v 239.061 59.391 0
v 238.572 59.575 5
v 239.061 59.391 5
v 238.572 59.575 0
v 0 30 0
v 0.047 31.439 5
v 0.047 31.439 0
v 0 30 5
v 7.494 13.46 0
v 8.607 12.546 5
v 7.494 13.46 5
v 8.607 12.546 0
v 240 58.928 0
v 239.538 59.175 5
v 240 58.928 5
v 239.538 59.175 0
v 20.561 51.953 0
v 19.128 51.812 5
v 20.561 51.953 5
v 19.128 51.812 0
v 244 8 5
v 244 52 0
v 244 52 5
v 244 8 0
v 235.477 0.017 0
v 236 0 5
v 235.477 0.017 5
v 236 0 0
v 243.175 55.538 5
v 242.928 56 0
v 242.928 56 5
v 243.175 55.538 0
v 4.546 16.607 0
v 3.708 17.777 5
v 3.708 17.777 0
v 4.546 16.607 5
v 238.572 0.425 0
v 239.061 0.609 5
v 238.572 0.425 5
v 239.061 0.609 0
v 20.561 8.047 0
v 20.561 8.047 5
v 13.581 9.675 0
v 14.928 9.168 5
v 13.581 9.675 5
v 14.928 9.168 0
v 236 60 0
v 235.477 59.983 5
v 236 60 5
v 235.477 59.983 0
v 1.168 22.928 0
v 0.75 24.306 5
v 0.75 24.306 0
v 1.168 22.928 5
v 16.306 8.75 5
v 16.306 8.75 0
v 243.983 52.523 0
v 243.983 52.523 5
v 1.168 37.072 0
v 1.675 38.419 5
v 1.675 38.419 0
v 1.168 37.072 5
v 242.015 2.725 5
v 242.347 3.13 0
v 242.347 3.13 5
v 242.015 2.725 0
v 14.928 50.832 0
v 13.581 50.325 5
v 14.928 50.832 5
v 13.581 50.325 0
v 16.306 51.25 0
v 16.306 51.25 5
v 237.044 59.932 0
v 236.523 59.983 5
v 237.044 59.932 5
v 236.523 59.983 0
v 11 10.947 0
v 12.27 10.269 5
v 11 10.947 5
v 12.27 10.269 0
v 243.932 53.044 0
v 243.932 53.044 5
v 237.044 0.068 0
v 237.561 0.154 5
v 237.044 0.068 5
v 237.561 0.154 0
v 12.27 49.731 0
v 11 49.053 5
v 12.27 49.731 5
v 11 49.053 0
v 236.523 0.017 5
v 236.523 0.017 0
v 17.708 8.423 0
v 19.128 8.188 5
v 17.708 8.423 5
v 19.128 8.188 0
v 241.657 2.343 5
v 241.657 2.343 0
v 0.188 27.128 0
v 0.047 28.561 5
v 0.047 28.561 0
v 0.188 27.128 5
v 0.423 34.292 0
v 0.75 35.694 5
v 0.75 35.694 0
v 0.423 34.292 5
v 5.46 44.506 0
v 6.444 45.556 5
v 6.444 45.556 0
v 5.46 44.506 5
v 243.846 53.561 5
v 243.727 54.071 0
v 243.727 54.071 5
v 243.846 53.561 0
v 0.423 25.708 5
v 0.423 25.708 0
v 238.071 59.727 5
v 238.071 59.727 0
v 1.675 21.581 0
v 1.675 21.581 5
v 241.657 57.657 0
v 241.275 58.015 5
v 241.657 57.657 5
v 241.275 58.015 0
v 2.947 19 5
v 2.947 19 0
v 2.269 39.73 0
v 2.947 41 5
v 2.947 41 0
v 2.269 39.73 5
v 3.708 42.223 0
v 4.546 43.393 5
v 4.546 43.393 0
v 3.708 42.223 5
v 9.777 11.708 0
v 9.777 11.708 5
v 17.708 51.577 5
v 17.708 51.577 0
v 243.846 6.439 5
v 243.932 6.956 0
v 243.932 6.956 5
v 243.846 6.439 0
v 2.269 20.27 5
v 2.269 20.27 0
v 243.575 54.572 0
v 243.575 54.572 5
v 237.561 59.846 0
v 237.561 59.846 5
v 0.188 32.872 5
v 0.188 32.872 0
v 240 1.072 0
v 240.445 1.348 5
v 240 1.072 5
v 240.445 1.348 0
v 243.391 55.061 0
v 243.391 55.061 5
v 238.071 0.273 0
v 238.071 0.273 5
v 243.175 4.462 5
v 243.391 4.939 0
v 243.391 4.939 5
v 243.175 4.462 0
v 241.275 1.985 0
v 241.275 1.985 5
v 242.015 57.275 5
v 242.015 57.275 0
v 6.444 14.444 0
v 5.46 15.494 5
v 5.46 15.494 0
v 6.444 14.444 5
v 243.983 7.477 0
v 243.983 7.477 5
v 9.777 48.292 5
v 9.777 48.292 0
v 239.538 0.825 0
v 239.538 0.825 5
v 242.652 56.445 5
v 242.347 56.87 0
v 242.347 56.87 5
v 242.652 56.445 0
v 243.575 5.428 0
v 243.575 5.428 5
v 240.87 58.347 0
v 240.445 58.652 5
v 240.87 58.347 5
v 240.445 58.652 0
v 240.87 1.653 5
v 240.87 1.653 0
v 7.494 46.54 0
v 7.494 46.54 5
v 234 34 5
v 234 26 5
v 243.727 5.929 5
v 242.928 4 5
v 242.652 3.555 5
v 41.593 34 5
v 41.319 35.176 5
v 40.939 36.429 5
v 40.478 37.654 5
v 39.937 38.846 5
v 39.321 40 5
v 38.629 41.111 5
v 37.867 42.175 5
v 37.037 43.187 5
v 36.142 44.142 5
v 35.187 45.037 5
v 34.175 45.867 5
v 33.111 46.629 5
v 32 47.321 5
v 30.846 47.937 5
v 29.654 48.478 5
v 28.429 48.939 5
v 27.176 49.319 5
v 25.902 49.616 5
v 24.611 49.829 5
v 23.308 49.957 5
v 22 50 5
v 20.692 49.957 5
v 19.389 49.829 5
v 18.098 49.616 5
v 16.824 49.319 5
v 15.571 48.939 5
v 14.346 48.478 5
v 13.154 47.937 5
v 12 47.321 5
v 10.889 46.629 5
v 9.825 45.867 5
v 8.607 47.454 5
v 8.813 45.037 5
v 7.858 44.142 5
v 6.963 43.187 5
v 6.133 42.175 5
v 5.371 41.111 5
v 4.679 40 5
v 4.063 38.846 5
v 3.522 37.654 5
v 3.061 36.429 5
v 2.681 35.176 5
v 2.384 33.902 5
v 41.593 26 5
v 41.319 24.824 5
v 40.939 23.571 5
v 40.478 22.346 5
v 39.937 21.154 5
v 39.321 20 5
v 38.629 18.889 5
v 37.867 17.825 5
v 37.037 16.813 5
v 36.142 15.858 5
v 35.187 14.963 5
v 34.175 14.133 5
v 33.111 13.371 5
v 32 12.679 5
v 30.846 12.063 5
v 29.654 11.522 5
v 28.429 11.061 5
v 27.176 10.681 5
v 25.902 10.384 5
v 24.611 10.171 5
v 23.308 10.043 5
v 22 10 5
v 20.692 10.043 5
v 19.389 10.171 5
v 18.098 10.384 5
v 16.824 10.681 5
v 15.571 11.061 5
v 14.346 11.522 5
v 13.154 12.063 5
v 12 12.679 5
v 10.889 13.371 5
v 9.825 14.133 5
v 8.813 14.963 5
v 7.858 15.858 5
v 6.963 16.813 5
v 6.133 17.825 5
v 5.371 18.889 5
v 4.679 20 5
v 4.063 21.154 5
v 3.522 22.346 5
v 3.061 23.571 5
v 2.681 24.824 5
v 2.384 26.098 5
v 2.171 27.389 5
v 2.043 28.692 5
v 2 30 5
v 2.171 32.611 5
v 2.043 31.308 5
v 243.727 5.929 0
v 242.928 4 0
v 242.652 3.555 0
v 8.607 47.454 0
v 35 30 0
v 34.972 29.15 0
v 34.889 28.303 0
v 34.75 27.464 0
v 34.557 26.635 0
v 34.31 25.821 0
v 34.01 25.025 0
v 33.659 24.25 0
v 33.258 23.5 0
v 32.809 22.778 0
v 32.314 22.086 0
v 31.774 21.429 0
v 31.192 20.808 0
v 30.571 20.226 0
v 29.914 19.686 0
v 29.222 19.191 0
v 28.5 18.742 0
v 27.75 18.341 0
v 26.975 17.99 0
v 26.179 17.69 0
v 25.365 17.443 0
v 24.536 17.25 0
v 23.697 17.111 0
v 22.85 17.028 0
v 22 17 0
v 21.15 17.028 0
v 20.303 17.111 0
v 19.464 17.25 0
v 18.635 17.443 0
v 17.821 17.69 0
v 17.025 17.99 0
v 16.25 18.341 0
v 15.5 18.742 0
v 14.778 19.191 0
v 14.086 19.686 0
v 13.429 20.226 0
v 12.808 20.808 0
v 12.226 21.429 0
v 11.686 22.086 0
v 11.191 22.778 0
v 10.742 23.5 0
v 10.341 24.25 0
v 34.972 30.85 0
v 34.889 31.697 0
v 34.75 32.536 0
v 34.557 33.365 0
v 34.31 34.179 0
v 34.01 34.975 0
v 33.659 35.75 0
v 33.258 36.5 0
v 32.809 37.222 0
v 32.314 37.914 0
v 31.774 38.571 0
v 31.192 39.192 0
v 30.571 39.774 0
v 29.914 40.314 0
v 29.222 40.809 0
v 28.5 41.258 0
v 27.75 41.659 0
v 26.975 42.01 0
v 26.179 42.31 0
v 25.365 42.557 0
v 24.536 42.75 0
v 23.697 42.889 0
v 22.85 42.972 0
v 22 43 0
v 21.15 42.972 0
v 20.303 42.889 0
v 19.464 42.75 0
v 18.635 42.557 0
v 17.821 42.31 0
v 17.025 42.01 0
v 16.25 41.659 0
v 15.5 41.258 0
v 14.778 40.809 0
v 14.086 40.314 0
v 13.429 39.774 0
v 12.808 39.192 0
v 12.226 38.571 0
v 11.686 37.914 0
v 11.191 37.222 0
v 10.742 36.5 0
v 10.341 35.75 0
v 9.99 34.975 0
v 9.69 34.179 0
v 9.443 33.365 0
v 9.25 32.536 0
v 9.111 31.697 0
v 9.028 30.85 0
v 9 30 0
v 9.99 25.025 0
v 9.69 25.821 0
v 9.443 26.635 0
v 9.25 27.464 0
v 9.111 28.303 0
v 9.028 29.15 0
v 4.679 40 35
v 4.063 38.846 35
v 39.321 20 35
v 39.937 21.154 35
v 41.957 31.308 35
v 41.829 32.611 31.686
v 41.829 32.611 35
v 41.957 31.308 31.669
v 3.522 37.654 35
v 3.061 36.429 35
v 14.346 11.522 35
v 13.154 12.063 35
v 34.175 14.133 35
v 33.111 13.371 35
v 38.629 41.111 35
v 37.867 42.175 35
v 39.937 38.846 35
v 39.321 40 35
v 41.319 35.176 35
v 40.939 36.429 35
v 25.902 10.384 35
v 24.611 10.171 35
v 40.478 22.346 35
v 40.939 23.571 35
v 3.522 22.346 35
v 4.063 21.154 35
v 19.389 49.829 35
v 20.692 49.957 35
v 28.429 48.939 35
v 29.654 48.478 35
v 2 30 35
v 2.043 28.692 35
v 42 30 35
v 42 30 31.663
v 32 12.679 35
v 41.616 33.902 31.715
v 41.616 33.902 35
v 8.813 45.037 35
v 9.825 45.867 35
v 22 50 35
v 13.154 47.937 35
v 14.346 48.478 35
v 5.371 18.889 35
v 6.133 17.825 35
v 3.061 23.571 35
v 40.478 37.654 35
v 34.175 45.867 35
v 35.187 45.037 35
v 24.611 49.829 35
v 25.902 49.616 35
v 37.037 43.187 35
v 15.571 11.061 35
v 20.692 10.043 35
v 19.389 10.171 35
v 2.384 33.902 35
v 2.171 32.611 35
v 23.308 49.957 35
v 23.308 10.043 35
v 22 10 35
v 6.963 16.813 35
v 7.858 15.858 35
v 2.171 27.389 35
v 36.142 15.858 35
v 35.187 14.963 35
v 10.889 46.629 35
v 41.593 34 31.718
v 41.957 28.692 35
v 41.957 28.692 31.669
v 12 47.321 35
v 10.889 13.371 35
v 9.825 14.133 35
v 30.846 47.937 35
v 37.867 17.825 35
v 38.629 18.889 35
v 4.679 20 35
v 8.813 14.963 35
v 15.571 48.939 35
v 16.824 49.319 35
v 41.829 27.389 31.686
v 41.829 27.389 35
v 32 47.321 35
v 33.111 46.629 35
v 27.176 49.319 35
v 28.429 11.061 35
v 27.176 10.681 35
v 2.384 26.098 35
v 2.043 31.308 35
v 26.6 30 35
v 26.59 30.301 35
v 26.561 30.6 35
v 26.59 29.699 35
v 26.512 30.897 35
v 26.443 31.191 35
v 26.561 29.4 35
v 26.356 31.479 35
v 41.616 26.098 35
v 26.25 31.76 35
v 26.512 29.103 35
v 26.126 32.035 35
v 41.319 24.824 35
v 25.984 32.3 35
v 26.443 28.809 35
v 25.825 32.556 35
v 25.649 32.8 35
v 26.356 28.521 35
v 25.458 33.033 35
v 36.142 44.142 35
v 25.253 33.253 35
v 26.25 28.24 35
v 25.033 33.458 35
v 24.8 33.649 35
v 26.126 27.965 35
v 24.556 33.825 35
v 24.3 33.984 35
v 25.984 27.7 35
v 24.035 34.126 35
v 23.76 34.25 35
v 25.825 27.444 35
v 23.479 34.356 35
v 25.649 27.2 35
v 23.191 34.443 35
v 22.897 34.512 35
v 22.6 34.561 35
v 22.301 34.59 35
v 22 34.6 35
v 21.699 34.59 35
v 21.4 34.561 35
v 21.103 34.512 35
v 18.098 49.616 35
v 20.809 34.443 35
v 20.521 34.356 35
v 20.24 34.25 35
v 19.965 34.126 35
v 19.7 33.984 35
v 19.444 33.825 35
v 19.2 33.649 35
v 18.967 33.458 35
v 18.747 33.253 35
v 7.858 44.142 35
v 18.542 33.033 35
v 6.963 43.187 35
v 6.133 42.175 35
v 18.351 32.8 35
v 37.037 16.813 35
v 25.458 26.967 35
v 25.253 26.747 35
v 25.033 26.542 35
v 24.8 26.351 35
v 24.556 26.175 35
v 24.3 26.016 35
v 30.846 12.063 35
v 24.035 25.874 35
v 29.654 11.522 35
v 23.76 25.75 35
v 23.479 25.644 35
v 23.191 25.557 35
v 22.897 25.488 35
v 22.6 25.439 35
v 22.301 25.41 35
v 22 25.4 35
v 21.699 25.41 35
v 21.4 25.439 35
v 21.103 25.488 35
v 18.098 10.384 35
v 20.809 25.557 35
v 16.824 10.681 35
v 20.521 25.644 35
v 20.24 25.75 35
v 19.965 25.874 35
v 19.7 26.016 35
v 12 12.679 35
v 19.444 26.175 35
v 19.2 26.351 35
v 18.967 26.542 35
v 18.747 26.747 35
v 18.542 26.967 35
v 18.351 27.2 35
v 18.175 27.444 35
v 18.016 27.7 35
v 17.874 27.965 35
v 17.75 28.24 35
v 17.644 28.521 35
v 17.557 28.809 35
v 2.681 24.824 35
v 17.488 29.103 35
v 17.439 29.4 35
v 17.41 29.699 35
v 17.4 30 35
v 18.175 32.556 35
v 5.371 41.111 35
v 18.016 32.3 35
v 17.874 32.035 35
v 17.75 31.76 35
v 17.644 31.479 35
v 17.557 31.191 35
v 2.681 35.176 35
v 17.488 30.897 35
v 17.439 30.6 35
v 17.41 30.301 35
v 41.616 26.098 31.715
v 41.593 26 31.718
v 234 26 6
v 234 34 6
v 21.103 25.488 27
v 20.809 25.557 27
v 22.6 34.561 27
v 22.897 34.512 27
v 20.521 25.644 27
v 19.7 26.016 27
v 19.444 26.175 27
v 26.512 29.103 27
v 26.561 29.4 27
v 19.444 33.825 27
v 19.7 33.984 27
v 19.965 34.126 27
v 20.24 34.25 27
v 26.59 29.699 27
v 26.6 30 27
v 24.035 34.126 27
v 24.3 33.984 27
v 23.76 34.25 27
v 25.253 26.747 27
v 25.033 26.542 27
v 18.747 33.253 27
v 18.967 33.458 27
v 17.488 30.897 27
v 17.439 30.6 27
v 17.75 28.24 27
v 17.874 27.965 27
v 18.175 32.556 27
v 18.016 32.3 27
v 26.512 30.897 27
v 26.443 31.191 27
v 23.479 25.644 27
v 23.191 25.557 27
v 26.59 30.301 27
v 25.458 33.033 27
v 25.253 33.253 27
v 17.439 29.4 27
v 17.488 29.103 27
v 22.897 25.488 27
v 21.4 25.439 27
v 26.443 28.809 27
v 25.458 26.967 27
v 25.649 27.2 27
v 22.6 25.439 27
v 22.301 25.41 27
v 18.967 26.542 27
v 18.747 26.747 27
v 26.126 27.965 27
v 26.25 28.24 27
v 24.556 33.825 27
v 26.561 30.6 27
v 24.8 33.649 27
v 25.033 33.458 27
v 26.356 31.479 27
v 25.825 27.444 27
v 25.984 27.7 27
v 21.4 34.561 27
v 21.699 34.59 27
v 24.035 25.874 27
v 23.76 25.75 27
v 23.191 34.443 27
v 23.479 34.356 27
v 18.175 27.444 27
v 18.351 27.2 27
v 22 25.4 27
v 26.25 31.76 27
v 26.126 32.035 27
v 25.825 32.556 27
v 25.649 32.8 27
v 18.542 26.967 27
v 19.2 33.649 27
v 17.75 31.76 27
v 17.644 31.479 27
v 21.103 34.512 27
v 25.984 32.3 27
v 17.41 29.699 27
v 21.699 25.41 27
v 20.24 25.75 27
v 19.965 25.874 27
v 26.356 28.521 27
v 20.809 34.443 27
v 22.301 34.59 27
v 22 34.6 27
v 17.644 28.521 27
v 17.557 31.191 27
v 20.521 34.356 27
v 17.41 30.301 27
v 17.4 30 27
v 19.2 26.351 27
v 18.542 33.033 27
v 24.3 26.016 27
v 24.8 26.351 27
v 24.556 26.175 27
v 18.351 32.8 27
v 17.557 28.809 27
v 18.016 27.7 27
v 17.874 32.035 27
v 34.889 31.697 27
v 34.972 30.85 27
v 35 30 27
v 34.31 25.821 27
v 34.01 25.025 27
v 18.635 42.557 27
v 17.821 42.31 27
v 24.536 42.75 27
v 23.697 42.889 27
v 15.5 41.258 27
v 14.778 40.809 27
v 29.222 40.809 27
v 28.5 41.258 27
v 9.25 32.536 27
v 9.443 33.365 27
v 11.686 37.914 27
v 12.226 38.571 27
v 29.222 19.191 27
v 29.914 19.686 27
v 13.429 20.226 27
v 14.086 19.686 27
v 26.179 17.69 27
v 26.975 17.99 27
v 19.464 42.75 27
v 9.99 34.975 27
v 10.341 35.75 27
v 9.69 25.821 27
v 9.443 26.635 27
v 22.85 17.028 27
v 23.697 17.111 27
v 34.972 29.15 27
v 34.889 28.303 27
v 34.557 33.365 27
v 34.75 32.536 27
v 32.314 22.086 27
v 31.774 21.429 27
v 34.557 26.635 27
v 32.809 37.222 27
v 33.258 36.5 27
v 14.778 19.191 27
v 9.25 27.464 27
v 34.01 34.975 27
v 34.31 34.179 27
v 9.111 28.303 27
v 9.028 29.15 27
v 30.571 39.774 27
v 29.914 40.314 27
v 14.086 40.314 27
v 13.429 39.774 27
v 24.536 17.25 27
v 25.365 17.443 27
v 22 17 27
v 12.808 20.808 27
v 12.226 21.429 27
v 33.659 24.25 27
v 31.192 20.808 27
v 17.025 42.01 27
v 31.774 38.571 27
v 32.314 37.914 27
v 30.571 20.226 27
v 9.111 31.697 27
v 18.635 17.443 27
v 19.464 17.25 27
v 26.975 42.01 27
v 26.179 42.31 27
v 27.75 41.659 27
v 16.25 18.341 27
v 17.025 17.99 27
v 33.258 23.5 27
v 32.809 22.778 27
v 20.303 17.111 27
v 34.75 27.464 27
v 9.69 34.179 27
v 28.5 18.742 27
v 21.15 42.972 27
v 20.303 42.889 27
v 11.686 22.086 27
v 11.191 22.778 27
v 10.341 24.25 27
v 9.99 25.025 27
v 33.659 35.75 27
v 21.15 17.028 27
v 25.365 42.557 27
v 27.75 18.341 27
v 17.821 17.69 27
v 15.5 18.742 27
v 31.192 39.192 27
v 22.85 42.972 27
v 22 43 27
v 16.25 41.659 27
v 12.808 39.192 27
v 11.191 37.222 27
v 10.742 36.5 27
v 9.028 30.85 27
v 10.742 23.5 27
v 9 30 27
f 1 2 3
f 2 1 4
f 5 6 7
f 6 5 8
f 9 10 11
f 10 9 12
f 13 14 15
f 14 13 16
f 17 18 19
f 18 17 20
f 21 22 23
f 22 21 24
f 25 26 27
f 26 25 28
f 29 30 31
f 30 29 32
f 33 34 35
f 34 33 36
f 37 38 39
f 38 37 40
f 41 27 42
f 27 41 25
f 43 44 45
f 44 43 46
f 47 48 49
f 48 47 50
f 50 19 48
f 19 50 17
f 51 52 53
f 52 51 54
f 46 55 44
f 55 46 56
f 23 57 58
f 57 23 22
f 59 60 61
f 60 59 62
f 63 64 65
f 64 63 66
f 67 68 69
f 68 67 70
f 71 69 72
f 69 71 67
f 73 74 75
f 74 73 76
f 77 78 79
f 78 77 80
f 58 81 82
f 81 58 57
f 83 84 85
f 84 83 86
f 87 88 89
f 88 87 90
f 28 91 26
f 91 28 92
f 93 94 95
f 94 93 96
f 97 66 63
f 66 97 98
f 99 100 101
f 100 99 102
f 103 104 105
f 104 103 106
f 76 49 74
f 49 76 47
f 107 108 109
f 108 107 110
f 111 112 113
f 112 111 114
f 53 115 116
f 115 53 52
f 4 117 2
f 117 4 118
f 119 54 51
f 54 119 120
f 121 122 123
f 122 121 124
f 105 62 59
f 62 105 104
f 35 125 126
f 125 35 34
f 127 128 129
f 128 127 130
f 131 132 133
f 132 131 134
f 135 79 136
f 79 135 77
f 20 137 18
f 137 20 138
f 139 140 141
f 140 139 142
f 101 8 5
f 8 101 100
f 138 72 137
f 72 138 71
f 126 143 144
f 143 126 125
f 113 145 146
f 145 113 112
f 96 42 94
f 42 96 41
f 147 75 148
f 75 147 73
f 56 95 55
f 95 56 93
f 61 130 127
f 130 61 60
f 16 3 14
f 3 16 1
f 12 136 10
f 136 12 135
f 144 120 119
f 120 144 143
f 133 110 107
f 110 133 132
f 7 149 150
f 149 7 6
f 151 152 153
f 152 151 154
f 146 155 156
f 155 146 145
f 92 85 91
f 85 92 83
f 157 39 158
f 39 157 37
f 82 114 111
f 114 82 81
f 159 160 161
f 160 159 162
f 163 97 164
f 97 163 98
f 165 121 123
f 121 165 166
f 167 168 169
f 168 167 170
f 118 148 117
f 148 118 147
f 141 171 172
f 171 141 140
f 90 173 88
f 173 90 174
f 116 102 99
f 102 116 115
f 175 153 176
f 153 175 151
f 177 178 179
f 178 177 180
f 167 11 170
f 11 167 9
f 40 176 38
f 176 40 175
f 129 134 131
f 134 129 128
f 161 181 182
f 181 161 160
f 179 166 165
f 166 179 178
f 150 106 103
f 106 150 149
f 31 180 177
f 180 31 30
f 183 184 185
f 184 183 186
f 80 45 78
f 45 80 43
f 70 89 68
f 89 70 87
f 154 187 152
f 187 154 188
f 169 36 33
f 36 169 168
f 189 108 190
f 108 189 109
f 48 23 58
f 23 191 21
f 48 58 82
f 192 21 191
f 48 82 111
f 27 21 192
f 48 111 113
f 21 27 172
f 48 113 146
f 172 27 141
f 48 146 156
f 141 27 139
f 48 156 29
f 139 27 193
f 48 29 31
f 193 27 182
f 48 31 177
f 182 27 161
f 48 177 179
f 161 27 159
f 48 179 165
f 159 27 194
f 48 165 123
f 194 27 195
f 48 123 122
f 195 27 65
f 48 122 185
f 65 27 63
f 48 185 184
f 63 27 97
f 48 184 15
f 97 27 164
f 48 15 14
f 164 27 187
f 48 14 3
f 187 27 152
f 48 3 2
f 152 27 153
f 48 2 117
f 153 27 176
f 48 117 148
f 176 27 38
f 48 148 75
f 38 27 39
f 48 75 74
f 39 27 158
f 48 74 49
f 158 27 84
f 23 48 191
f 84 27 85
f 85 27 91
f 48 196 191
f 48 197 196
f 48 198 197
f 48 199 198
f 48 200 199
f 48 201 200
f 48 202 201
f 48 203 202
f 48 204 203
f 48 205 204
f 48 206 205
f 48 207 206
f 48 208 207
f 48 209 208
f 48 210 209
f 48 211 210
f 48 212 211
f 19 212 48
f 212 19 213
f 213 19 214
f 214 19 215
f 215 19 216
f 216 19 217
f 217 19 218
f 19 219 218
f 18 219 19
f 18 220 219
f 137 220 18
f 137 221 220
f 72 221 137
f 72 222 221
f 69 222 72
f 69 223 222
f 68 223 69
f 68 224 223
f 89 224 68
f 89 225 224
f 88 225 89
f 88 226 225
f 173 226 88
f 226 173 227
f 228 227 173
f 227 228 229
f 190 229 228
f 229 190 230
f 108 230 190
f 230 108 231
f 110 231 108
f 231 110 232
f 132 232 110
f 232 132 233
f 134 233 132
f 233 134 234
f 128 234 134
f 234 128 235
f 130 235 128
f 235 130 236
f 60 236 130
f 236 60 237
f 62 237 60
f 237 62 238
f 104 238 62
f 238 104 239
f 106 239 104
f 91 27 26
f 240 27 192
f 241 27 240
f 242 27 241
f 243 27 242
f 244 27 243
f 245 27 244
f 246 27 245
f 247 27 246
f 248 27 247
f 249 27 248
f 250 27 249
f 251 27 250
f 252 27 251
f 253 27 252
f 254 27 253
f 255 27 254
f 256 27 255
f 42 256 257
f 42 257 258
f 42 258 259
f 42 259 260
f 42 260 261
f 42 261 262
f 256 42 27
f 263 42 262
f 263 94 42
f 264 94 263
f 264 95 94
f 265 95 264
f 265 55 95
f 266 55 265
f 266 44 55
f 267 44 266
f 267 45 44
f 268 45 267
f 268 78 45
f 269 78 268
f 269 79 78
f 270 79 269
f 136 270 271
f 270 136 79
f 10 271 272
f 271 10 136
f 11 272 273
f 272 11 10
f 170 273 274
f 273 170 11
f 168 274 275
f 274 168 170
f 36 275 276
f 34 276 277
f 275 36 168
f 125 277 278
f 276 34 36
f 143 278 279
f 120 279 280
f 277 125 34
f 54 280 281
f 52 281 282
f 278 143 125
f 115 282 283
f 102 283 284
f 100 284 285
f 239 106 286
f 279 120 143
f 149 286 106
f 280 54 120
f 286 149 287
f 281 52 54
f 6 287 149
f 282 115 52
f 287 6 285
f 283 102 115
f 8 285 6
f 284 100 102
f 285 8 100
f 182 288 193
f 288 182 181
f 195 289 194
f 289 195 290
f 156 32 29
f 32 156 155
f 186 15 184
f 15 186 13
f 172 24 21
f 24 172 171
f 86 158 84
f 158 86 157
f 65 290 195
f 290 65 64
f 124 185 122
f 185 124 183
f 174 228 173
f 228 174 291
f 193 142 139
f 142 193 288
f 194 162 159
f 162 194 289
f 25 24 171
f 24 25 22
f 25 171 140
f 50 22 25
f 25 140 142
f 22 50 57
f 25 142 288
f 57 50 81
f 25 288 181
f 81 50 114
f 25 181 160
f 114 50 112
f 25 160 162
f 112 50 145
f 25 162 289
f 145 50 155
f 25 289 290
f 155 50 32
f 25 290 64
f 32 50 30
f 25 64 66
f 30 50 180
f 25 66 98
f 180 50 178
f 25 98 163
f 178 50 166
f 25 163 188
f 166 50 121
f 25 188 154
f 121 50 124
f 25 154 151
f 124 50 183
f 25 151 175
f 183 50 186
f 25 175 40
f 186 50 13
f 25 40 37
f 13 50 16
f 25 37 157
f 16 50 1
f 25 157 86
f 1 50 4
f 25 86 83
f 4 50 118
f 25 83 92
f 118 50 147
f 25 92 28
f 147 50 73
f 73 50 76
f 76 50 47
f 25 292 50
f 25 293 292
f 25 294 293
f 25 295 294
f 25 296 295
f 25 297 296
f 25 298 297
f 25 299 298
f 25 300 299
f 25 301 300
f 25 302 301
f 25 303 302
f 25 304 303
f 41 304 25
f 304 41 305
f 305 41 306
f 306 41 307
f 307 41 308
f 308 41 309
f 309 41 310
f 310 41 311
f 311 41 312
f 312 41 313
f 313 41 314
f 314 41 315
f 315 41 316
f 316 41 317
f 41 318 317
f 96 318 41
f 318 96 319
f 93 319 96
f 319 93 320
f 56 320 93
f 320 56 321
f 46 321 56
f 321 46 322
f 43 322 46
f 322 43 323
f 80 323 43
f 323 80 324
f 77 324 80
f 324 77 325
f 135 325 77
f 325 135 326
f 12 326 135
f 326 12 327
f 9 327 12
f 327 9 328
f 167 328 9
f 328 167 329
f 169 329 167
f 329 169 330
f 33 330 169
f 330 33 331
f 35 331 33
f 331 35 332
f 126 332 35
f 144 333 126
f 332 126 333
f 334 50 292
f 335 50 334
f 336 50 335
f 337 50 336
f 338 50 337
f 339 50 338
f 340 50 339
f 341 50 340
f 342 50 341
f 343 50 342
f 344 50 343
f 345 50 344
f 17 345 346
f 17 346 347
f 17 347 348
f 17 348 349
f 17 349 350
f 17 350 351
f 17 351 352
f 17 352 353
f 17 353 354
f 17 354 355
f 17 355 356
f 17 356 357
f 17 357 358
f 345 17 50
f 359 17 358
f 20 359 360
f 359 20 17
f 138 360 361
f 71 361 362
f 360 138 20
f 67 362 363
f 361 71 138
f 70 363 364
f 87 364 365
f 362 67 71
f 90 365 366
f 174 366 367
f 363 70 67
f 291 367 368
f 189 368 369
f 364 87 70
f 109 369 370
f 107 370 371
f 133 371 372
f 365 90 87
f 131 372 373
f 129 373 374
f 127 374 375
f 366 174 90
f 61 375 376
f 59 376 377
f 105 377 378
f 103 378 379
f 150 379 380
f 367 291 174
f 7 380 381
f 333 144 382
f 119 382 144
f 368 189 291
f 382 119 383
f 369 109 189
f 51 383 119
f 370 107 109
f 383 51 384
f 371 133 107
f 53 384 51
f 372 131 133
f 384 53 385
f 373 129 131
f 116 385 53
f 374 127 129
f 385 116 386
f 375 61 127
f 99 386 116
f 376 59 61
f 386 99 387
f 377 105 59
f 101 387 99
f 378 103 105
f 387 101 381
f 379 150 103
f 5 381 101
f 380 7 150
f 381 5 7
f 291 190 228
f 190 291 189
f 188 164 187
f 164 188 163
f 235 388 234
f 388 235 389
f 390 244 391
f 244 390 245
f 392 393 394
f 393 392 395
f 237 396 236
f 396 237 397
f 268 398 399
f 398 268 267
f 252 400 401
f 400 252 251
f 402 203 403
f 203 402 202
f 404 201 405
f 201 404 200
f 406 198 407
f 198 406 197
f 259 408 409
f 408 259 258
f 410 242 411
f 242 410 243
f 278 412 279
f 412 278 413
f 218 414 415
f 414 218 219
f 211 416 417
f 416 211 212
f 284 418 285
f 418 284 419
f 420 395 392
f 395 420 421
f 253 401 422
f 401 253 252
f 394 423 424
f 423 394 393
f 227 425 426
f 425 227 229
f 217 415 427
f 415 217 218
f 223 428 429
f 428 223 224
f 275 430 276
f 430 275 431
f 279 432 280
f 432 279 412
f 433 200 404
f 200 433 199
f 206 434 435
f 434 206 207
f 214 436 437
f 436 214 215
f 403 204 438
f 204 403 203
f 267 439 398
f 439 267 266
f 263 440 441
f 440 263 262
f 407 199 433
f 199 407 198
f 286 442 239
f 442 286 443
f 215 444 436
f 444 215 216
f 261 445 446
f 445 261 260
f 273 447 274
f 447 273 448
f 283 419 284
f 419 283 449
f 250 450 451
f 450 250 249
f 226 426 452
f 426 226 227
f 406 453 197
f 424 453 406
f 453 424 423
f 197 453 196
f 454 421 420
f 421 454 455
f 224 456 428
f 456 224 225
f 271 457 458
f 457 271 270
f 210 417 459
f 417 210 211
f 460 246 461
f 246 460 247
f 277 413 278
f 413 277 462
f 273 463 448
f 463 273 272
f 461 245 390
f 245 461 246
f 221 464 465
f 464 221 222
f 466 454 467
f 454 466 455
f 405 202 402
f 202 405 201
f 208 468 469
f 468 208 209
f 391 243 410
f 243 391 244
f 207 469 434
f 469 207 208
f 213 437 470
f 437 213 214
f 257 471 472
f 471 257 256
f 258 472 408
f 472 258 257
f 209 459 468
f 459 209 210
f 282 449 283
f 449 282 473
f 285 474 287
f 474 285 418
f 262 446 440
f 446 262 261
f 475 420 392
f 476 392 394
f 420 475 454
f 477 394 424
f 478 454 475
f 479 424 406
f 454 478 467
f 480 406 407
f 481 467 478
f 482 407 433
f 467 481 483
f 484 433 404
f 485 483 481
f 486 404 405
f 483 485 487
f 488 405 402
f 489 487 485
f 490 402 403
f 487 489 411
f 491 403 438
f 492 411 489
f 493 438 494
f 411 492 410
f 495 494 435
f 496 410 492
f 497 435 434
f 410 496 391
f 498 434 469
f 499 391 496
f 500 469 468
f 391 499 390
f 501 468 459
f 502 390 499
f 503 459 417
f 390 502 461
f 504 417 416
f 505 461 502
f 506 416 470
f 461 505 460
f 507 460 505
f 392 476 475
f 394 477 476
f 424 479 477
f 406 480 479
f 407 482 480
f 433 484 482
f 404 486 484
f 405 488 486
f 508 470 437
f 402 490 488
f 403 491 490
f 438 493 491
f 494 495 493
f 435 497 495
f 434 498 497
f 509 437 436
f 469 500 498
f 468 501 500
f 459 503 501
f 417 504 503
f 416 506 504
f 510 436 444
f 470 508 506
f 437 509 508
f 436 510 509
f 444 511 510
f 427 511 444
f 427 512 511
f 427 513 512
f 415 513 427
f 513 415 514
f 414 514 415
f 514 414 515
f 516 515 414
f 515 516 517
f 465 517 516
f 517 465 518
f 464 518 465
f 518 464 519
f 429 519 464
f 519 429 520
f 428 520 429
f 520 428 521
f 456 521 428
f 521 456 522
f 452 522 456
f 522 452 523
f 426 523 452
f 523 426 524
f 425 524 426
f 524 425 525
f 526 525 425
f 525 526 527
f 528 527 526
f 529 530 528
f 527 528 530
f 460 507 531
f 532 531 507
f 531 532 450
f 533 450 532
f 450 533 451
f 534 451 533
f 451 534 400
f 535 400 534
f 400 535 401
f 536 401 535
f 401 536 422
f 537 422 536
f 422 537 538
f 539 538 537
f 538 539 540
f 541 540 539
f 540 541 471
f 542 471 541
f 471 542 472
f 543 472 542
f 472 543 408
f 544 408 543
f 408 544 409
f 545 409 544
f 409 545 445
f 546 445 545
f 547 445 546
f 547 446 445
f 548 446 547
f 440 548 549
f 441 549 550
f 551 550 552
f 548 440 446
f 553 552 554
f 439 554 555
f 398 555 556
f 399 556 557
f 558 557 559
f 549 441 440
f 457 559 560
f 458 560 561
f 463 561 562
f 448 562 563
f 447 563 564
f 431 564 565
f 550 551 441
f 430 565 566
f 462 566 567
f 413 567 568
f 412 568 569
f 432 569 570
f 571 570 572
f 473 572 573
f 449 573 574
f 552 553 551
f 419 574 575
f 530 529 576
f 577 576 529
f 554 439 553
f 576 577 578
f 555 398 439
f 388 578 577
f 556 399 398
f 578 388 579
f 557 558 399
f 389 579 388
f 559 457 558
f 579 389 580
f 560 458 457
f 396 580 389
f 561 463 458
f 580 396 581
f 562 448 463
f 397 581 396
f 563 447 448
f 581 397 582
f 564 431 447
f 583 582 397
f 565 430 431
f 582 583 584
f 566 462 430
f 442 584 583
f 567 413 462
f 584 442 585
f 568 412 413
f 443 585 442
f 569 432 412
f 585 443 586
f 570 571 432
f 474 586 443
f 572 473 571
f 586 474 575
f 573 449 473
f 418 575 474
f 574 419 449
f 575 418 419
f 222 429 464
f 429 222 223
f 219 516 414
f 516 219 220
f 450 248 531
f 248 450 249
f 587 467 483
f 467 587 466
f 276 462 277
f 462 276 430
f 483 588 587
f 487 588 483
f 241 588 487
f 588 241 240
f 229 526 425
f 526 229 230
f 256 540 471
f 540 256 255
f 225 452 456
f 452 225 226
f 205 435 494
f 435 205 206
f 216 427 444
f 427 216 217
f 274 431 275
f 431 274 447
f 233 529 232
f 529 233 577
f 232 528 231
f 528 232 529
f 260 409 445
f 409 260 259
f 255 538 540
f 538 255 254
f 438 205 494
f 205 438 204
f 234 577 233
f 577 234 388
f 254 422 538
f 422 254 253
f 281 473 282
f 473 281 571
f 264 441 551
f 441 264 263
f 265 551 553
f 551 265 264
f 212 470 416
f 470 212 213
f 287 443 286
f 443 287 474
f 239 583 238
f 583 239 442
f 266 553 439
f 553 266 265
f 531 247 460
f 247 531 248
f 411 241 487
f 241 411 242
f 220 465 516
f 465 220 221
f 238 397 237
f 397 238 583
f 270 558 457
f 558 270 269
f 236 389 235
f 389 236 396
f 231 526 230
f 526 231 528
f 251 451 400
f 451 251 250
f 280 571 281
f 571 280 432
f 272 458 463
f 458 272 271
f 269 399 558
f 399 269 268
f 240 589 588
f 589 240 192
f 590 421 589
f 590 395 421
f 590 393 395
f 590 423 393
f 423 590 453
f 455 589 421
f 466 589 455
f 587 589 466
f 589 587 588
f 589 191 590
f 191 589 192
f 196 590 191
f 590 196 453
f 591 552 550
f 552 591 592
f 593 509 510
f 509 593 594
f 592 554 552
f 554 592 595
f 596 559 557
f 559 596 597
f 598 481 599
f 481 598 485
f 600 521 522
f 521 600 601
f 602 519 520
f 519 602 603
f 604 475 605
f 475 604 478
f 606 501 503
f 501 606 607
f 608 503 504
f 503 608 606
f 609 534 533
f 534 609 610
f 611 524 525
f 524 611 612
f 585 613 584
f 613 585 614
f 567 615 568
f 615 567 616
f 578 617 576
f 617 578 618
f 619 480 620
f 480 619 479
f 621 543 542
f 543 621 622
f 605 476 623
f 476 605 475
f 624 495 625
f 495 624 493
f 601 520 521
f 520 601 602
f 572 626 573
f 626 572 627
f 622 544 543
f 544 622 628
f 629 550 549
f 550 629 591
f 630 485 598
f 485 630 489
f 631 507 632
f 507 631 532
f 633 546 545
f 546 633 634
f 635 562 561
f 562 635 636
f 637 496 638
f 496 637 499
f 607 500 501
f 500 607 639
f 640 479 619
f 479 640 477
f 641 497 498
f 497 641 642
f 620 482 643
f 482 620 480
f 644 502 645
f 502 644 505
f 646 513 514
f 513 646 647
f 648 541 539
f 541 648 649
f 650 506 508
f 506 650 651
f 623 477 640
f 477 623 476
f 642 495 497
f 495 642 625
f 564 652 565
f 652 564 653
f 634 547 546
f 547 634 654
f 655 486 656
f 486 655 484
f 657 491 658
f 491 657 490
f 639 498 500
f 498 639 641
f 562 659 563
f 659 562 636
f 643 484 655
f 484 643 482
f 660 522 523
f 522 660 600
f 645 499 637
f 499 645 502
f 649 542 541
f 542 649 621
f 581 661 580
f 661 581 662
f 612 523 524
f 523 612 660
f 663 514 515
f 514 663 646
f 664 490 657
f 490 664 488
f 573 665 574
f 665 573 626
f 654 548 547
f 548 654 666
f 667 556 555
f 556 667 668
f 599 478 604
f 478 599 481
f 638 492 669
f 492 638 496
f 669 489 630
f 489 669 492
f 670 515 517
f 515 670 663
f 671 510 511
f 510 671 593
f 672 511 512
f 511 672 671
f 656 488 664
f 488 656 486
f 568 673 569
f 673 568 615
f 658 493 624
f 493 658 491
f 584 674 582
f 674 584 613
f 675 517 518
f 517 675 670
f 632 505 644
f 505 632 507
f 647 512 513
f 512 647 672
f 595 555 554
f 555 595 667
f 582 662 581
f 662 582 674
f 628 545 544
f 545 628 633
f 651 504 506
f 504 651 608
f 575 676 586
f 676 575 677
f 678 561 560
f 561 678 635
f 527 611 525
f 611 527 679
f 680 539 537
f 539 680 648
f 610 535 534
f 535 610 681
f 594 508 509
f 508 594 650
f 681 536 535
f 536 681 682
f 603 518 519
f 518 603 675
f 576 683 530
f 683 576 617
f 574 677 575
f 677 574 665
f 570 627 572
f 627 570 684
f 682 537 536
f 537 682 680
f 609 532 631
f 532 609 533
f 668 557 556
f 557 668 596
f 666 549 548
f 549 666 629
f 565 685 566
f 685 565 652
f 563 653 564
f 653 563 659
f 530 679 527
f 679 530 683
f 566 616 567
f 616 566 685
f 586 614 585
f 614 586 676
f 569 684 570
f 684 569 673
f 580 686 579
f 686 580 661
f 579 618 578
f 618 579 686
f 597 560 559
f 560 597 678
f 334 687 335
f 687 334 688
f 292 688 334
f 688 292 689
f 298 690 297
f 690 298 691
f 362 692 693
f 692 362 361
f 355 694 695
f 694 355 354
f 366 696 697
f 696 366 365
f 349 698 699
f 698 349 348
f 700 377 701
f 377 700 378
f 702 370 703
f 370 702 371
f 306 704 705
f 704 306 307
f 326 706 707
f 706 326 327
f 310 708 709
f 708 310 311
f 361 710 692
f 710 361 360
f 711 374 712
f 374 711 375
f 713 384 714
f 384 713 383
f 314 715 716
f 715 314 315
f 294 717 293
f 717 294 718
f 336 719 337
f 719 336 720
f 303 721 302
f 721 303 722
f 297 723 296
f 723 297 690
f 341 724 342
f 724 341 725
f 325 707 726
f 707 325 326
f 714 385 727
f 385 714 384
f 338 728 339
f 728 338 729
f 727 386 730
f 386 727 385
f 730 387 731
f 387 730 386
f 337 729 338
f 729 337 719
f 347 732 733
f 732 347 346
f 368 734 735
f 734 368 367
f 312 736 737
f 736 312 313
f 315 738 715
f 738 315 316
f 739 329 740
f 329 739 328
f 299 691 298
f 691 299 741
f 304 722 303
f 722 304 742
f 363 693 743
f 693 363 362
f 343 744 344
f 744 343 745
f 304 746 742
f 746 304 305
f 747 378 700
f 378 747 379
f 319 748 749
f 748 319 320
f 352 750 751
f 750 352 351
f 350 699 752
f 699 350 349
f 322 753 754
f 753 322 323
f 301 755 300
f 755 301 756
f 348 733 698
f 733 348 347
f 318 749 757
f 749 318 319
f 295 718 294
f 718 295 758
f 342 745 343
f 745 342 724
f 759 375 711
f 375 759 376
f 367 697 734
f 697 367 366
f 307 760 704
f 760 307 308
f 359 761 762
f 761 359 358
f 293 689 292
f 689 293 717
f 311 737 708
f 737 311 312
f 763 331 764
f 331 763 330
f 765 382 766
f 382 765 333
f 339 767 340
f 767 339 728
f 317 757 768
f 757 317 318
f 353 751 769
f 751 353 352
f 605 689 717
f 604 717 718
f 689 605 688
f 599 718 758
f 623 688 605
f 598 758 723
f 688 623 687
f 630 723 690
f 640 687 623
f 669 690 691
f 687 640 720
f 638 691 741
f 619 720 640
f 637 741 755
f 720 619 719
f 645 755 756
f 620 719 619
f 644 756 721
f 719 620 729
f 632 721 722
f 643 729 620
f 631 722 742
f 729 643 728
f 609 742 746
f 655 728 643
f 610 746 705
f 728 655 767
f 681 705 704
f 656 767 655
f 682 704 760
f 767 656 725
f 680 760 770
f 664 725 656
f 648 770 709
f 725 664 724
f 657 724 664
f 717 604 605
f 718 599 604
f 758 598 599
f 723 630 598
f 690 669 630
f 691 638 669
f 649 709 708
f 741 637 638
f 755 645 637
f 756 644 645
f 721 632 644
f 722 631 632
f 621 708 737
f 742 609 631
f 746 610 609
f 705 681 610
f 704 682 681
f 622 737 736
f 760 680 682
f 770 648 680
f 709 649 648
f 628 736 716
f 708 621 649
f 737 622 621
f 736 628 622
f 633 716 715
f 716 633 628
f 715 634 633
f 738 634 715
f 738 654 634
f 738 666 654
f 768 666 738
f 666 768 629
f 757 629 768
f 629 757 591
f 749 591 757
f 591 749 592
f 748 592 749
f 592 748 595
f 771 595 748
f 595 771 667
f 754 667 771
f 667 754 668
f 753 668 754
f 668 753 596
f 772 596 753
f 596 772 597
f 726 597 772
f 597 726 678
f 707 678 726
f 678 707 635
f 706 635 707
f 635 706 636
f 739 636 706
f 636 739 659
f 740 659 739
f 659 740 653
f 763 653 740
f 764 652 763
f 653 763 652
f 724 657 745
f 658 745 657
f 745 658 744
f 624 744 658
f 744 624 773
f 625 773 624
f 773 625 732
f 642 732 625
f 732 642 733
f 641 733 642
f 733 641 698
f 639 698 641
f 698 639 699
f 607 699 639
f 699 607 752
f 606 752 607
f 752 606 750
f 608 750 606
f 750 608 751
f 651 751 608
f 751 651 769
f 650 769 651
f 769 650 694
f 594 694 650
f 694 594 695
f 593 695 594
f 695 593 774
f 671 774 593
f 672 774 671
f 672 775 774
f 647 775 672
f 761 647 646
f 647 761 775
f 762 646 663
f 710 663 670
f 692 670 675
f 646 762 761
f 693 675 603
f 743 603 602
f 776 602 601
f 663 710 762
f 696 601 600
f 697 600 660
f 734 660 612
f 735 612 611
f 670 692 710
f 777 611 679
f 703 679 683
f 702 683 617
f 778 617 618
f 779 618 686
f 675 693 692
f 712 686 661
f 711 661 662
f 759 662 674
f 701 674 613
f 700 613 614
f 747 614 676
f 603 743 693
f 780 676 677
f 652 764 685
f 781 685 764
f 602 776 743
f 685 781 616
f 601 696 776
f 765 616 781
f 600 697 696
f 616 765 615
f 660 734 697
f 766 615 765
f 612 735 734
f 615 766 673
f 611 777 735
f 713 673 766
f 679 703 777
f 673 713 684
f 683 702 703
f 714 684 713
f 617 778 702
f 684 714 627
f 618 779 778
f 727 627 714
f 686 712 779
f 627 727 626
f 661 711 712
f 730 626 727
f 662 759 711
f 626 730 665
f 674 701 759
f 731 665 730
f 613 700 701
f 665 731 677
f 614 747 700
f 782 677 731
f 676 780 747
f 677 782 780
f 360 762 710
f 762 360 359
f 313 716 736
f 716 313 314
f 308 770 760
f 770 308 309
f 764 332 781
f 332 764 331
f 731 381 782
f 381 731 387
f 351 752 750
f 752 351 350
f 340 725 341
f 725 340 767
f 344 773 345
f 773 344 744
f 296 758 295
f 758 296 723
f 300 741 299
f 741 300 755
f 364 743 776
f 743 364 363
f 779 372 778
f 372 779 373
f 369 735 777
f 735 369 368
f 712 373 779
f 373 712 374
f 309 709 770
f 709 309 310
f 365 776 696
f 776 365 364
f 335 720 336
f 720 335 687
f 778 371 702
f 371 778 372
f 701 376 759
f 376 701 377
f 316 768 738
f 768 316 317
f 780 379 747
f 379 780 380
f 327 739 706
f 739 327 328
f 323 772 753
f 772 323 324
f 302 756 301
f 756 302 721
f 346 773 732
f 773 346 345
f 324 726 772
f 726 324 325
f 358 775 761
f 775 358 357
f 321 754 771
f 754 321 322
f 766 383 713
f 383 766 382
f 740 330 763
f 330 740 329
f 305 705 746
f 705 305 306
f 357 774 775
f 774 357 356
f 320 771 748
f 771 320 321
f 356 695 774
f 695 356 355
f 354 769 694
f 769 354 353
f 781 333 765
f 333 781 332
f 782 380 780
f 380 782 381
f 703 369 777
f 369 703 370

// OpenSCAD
// file: ../../lib/winch-desk-feet.scad
// ARBI passive winch desk feet 0.1.0 - concept-unvalidated.
// Millimetres. Licence: AGPL-3.0-only.
// Print two "short" and two "long". Flat soles at Z=0.
// Geometry reference: gredice/arbi d8235b0e2f42ad4c10463550c660321c79408fa9
// hardware/lib/winch-mount.scad: passive 550 x 180 x 8 base,
// post hole pattern 50 x 120, centres (148.45/198.45, 30/150) from edges.
// Bench prototype for unloaded desk checks; not a cable-load fixture.

wdf_height = 35;
wdf_base_thickness = 5;
wdf_short_length = 160;
wdf_long_length = 244;
wdf_boss_d = 40;
wdf_bolt_d = 9.2;
wdf_bolt_from_end = 22;
wdf_nut_access_d = 26;
wdf_roof_thickness = 8;
wdf_rib_width = 8;

wdf_eps = 0.05;

assert(wdf_height >= 30);
assert(wdf_roof_thickness >= 8);
assert(wdf_boss_d >= wdf_nut_access_d + 12);

module wdf_sole_2d(length) {
    // Broad end pads and a narrower connecting strip.
    hull() {
        translate([0,0]) circle(d=44,$fn=96);
        for (y=[-22,22]) translate([length-wdf_bolt_from_end-8,y]) circle(r=8,$fn=96);
    }
}

module wdf_foot(length) {
    difference() {
        union() {
            linear_extrude(wdf_base_thickness) wdf_sole_2d(length);
            cylinder(d=wdf_boss_d,h=wdf_height,$fn=96);
            // Two-sided central buttress; printed vertically above the sole.
            translate([0,wdf_rib_width/2,0]) rotate([90,0,0])
                linear_extrude(wdf_rib_width)
                    polygon([[10,wdf_base_thickness-wdf_eps],
                             [10,wdf_height-2],
                             [length-wdf_bolt_from_end-10,wdf_base_thickness+1],
                             [length-wdf_bolt_from_end-10,wdf_base_thickness-wdf_eps]]);
        }
        translate([0,0,-wdf_eps]) cylinder(d=wdf_bolt_d,h=wdf_height+2*wdf_eps,$fn=96);
        // Recess holds a standard M8 washer/nut entirely above the desk.
        // Generate build-plate-only support in this pocket if bridging is poor.
        translate([0,0,-wdf_eps]) cylinder(d=wdf_nut_access_d,h=wdf_height-wdf_roof_thickness+wdf_eps,$fn=96);
    }
}

module wdf_print_foot(length) {
    translate([wdf_bolt_from_end,30,0]) wdf_foot(length);
}

module wdf_installed_feet() {
    for(y=[30,150]) {
        translate([148.45,y,0]) rotate([0,0,180]) wdf_foot(wdf_short_length);
        translate([198.45,y,0]) wdf_foot(wdf_long_length);
    }
}
// main file
// winch-desk-foot-long 0.1.0 - concept-unvalidated. Print two for one passive base.
include <../../lib/winch-desk-feet.scad>
wdf_print_foot(wdf_long_length);
